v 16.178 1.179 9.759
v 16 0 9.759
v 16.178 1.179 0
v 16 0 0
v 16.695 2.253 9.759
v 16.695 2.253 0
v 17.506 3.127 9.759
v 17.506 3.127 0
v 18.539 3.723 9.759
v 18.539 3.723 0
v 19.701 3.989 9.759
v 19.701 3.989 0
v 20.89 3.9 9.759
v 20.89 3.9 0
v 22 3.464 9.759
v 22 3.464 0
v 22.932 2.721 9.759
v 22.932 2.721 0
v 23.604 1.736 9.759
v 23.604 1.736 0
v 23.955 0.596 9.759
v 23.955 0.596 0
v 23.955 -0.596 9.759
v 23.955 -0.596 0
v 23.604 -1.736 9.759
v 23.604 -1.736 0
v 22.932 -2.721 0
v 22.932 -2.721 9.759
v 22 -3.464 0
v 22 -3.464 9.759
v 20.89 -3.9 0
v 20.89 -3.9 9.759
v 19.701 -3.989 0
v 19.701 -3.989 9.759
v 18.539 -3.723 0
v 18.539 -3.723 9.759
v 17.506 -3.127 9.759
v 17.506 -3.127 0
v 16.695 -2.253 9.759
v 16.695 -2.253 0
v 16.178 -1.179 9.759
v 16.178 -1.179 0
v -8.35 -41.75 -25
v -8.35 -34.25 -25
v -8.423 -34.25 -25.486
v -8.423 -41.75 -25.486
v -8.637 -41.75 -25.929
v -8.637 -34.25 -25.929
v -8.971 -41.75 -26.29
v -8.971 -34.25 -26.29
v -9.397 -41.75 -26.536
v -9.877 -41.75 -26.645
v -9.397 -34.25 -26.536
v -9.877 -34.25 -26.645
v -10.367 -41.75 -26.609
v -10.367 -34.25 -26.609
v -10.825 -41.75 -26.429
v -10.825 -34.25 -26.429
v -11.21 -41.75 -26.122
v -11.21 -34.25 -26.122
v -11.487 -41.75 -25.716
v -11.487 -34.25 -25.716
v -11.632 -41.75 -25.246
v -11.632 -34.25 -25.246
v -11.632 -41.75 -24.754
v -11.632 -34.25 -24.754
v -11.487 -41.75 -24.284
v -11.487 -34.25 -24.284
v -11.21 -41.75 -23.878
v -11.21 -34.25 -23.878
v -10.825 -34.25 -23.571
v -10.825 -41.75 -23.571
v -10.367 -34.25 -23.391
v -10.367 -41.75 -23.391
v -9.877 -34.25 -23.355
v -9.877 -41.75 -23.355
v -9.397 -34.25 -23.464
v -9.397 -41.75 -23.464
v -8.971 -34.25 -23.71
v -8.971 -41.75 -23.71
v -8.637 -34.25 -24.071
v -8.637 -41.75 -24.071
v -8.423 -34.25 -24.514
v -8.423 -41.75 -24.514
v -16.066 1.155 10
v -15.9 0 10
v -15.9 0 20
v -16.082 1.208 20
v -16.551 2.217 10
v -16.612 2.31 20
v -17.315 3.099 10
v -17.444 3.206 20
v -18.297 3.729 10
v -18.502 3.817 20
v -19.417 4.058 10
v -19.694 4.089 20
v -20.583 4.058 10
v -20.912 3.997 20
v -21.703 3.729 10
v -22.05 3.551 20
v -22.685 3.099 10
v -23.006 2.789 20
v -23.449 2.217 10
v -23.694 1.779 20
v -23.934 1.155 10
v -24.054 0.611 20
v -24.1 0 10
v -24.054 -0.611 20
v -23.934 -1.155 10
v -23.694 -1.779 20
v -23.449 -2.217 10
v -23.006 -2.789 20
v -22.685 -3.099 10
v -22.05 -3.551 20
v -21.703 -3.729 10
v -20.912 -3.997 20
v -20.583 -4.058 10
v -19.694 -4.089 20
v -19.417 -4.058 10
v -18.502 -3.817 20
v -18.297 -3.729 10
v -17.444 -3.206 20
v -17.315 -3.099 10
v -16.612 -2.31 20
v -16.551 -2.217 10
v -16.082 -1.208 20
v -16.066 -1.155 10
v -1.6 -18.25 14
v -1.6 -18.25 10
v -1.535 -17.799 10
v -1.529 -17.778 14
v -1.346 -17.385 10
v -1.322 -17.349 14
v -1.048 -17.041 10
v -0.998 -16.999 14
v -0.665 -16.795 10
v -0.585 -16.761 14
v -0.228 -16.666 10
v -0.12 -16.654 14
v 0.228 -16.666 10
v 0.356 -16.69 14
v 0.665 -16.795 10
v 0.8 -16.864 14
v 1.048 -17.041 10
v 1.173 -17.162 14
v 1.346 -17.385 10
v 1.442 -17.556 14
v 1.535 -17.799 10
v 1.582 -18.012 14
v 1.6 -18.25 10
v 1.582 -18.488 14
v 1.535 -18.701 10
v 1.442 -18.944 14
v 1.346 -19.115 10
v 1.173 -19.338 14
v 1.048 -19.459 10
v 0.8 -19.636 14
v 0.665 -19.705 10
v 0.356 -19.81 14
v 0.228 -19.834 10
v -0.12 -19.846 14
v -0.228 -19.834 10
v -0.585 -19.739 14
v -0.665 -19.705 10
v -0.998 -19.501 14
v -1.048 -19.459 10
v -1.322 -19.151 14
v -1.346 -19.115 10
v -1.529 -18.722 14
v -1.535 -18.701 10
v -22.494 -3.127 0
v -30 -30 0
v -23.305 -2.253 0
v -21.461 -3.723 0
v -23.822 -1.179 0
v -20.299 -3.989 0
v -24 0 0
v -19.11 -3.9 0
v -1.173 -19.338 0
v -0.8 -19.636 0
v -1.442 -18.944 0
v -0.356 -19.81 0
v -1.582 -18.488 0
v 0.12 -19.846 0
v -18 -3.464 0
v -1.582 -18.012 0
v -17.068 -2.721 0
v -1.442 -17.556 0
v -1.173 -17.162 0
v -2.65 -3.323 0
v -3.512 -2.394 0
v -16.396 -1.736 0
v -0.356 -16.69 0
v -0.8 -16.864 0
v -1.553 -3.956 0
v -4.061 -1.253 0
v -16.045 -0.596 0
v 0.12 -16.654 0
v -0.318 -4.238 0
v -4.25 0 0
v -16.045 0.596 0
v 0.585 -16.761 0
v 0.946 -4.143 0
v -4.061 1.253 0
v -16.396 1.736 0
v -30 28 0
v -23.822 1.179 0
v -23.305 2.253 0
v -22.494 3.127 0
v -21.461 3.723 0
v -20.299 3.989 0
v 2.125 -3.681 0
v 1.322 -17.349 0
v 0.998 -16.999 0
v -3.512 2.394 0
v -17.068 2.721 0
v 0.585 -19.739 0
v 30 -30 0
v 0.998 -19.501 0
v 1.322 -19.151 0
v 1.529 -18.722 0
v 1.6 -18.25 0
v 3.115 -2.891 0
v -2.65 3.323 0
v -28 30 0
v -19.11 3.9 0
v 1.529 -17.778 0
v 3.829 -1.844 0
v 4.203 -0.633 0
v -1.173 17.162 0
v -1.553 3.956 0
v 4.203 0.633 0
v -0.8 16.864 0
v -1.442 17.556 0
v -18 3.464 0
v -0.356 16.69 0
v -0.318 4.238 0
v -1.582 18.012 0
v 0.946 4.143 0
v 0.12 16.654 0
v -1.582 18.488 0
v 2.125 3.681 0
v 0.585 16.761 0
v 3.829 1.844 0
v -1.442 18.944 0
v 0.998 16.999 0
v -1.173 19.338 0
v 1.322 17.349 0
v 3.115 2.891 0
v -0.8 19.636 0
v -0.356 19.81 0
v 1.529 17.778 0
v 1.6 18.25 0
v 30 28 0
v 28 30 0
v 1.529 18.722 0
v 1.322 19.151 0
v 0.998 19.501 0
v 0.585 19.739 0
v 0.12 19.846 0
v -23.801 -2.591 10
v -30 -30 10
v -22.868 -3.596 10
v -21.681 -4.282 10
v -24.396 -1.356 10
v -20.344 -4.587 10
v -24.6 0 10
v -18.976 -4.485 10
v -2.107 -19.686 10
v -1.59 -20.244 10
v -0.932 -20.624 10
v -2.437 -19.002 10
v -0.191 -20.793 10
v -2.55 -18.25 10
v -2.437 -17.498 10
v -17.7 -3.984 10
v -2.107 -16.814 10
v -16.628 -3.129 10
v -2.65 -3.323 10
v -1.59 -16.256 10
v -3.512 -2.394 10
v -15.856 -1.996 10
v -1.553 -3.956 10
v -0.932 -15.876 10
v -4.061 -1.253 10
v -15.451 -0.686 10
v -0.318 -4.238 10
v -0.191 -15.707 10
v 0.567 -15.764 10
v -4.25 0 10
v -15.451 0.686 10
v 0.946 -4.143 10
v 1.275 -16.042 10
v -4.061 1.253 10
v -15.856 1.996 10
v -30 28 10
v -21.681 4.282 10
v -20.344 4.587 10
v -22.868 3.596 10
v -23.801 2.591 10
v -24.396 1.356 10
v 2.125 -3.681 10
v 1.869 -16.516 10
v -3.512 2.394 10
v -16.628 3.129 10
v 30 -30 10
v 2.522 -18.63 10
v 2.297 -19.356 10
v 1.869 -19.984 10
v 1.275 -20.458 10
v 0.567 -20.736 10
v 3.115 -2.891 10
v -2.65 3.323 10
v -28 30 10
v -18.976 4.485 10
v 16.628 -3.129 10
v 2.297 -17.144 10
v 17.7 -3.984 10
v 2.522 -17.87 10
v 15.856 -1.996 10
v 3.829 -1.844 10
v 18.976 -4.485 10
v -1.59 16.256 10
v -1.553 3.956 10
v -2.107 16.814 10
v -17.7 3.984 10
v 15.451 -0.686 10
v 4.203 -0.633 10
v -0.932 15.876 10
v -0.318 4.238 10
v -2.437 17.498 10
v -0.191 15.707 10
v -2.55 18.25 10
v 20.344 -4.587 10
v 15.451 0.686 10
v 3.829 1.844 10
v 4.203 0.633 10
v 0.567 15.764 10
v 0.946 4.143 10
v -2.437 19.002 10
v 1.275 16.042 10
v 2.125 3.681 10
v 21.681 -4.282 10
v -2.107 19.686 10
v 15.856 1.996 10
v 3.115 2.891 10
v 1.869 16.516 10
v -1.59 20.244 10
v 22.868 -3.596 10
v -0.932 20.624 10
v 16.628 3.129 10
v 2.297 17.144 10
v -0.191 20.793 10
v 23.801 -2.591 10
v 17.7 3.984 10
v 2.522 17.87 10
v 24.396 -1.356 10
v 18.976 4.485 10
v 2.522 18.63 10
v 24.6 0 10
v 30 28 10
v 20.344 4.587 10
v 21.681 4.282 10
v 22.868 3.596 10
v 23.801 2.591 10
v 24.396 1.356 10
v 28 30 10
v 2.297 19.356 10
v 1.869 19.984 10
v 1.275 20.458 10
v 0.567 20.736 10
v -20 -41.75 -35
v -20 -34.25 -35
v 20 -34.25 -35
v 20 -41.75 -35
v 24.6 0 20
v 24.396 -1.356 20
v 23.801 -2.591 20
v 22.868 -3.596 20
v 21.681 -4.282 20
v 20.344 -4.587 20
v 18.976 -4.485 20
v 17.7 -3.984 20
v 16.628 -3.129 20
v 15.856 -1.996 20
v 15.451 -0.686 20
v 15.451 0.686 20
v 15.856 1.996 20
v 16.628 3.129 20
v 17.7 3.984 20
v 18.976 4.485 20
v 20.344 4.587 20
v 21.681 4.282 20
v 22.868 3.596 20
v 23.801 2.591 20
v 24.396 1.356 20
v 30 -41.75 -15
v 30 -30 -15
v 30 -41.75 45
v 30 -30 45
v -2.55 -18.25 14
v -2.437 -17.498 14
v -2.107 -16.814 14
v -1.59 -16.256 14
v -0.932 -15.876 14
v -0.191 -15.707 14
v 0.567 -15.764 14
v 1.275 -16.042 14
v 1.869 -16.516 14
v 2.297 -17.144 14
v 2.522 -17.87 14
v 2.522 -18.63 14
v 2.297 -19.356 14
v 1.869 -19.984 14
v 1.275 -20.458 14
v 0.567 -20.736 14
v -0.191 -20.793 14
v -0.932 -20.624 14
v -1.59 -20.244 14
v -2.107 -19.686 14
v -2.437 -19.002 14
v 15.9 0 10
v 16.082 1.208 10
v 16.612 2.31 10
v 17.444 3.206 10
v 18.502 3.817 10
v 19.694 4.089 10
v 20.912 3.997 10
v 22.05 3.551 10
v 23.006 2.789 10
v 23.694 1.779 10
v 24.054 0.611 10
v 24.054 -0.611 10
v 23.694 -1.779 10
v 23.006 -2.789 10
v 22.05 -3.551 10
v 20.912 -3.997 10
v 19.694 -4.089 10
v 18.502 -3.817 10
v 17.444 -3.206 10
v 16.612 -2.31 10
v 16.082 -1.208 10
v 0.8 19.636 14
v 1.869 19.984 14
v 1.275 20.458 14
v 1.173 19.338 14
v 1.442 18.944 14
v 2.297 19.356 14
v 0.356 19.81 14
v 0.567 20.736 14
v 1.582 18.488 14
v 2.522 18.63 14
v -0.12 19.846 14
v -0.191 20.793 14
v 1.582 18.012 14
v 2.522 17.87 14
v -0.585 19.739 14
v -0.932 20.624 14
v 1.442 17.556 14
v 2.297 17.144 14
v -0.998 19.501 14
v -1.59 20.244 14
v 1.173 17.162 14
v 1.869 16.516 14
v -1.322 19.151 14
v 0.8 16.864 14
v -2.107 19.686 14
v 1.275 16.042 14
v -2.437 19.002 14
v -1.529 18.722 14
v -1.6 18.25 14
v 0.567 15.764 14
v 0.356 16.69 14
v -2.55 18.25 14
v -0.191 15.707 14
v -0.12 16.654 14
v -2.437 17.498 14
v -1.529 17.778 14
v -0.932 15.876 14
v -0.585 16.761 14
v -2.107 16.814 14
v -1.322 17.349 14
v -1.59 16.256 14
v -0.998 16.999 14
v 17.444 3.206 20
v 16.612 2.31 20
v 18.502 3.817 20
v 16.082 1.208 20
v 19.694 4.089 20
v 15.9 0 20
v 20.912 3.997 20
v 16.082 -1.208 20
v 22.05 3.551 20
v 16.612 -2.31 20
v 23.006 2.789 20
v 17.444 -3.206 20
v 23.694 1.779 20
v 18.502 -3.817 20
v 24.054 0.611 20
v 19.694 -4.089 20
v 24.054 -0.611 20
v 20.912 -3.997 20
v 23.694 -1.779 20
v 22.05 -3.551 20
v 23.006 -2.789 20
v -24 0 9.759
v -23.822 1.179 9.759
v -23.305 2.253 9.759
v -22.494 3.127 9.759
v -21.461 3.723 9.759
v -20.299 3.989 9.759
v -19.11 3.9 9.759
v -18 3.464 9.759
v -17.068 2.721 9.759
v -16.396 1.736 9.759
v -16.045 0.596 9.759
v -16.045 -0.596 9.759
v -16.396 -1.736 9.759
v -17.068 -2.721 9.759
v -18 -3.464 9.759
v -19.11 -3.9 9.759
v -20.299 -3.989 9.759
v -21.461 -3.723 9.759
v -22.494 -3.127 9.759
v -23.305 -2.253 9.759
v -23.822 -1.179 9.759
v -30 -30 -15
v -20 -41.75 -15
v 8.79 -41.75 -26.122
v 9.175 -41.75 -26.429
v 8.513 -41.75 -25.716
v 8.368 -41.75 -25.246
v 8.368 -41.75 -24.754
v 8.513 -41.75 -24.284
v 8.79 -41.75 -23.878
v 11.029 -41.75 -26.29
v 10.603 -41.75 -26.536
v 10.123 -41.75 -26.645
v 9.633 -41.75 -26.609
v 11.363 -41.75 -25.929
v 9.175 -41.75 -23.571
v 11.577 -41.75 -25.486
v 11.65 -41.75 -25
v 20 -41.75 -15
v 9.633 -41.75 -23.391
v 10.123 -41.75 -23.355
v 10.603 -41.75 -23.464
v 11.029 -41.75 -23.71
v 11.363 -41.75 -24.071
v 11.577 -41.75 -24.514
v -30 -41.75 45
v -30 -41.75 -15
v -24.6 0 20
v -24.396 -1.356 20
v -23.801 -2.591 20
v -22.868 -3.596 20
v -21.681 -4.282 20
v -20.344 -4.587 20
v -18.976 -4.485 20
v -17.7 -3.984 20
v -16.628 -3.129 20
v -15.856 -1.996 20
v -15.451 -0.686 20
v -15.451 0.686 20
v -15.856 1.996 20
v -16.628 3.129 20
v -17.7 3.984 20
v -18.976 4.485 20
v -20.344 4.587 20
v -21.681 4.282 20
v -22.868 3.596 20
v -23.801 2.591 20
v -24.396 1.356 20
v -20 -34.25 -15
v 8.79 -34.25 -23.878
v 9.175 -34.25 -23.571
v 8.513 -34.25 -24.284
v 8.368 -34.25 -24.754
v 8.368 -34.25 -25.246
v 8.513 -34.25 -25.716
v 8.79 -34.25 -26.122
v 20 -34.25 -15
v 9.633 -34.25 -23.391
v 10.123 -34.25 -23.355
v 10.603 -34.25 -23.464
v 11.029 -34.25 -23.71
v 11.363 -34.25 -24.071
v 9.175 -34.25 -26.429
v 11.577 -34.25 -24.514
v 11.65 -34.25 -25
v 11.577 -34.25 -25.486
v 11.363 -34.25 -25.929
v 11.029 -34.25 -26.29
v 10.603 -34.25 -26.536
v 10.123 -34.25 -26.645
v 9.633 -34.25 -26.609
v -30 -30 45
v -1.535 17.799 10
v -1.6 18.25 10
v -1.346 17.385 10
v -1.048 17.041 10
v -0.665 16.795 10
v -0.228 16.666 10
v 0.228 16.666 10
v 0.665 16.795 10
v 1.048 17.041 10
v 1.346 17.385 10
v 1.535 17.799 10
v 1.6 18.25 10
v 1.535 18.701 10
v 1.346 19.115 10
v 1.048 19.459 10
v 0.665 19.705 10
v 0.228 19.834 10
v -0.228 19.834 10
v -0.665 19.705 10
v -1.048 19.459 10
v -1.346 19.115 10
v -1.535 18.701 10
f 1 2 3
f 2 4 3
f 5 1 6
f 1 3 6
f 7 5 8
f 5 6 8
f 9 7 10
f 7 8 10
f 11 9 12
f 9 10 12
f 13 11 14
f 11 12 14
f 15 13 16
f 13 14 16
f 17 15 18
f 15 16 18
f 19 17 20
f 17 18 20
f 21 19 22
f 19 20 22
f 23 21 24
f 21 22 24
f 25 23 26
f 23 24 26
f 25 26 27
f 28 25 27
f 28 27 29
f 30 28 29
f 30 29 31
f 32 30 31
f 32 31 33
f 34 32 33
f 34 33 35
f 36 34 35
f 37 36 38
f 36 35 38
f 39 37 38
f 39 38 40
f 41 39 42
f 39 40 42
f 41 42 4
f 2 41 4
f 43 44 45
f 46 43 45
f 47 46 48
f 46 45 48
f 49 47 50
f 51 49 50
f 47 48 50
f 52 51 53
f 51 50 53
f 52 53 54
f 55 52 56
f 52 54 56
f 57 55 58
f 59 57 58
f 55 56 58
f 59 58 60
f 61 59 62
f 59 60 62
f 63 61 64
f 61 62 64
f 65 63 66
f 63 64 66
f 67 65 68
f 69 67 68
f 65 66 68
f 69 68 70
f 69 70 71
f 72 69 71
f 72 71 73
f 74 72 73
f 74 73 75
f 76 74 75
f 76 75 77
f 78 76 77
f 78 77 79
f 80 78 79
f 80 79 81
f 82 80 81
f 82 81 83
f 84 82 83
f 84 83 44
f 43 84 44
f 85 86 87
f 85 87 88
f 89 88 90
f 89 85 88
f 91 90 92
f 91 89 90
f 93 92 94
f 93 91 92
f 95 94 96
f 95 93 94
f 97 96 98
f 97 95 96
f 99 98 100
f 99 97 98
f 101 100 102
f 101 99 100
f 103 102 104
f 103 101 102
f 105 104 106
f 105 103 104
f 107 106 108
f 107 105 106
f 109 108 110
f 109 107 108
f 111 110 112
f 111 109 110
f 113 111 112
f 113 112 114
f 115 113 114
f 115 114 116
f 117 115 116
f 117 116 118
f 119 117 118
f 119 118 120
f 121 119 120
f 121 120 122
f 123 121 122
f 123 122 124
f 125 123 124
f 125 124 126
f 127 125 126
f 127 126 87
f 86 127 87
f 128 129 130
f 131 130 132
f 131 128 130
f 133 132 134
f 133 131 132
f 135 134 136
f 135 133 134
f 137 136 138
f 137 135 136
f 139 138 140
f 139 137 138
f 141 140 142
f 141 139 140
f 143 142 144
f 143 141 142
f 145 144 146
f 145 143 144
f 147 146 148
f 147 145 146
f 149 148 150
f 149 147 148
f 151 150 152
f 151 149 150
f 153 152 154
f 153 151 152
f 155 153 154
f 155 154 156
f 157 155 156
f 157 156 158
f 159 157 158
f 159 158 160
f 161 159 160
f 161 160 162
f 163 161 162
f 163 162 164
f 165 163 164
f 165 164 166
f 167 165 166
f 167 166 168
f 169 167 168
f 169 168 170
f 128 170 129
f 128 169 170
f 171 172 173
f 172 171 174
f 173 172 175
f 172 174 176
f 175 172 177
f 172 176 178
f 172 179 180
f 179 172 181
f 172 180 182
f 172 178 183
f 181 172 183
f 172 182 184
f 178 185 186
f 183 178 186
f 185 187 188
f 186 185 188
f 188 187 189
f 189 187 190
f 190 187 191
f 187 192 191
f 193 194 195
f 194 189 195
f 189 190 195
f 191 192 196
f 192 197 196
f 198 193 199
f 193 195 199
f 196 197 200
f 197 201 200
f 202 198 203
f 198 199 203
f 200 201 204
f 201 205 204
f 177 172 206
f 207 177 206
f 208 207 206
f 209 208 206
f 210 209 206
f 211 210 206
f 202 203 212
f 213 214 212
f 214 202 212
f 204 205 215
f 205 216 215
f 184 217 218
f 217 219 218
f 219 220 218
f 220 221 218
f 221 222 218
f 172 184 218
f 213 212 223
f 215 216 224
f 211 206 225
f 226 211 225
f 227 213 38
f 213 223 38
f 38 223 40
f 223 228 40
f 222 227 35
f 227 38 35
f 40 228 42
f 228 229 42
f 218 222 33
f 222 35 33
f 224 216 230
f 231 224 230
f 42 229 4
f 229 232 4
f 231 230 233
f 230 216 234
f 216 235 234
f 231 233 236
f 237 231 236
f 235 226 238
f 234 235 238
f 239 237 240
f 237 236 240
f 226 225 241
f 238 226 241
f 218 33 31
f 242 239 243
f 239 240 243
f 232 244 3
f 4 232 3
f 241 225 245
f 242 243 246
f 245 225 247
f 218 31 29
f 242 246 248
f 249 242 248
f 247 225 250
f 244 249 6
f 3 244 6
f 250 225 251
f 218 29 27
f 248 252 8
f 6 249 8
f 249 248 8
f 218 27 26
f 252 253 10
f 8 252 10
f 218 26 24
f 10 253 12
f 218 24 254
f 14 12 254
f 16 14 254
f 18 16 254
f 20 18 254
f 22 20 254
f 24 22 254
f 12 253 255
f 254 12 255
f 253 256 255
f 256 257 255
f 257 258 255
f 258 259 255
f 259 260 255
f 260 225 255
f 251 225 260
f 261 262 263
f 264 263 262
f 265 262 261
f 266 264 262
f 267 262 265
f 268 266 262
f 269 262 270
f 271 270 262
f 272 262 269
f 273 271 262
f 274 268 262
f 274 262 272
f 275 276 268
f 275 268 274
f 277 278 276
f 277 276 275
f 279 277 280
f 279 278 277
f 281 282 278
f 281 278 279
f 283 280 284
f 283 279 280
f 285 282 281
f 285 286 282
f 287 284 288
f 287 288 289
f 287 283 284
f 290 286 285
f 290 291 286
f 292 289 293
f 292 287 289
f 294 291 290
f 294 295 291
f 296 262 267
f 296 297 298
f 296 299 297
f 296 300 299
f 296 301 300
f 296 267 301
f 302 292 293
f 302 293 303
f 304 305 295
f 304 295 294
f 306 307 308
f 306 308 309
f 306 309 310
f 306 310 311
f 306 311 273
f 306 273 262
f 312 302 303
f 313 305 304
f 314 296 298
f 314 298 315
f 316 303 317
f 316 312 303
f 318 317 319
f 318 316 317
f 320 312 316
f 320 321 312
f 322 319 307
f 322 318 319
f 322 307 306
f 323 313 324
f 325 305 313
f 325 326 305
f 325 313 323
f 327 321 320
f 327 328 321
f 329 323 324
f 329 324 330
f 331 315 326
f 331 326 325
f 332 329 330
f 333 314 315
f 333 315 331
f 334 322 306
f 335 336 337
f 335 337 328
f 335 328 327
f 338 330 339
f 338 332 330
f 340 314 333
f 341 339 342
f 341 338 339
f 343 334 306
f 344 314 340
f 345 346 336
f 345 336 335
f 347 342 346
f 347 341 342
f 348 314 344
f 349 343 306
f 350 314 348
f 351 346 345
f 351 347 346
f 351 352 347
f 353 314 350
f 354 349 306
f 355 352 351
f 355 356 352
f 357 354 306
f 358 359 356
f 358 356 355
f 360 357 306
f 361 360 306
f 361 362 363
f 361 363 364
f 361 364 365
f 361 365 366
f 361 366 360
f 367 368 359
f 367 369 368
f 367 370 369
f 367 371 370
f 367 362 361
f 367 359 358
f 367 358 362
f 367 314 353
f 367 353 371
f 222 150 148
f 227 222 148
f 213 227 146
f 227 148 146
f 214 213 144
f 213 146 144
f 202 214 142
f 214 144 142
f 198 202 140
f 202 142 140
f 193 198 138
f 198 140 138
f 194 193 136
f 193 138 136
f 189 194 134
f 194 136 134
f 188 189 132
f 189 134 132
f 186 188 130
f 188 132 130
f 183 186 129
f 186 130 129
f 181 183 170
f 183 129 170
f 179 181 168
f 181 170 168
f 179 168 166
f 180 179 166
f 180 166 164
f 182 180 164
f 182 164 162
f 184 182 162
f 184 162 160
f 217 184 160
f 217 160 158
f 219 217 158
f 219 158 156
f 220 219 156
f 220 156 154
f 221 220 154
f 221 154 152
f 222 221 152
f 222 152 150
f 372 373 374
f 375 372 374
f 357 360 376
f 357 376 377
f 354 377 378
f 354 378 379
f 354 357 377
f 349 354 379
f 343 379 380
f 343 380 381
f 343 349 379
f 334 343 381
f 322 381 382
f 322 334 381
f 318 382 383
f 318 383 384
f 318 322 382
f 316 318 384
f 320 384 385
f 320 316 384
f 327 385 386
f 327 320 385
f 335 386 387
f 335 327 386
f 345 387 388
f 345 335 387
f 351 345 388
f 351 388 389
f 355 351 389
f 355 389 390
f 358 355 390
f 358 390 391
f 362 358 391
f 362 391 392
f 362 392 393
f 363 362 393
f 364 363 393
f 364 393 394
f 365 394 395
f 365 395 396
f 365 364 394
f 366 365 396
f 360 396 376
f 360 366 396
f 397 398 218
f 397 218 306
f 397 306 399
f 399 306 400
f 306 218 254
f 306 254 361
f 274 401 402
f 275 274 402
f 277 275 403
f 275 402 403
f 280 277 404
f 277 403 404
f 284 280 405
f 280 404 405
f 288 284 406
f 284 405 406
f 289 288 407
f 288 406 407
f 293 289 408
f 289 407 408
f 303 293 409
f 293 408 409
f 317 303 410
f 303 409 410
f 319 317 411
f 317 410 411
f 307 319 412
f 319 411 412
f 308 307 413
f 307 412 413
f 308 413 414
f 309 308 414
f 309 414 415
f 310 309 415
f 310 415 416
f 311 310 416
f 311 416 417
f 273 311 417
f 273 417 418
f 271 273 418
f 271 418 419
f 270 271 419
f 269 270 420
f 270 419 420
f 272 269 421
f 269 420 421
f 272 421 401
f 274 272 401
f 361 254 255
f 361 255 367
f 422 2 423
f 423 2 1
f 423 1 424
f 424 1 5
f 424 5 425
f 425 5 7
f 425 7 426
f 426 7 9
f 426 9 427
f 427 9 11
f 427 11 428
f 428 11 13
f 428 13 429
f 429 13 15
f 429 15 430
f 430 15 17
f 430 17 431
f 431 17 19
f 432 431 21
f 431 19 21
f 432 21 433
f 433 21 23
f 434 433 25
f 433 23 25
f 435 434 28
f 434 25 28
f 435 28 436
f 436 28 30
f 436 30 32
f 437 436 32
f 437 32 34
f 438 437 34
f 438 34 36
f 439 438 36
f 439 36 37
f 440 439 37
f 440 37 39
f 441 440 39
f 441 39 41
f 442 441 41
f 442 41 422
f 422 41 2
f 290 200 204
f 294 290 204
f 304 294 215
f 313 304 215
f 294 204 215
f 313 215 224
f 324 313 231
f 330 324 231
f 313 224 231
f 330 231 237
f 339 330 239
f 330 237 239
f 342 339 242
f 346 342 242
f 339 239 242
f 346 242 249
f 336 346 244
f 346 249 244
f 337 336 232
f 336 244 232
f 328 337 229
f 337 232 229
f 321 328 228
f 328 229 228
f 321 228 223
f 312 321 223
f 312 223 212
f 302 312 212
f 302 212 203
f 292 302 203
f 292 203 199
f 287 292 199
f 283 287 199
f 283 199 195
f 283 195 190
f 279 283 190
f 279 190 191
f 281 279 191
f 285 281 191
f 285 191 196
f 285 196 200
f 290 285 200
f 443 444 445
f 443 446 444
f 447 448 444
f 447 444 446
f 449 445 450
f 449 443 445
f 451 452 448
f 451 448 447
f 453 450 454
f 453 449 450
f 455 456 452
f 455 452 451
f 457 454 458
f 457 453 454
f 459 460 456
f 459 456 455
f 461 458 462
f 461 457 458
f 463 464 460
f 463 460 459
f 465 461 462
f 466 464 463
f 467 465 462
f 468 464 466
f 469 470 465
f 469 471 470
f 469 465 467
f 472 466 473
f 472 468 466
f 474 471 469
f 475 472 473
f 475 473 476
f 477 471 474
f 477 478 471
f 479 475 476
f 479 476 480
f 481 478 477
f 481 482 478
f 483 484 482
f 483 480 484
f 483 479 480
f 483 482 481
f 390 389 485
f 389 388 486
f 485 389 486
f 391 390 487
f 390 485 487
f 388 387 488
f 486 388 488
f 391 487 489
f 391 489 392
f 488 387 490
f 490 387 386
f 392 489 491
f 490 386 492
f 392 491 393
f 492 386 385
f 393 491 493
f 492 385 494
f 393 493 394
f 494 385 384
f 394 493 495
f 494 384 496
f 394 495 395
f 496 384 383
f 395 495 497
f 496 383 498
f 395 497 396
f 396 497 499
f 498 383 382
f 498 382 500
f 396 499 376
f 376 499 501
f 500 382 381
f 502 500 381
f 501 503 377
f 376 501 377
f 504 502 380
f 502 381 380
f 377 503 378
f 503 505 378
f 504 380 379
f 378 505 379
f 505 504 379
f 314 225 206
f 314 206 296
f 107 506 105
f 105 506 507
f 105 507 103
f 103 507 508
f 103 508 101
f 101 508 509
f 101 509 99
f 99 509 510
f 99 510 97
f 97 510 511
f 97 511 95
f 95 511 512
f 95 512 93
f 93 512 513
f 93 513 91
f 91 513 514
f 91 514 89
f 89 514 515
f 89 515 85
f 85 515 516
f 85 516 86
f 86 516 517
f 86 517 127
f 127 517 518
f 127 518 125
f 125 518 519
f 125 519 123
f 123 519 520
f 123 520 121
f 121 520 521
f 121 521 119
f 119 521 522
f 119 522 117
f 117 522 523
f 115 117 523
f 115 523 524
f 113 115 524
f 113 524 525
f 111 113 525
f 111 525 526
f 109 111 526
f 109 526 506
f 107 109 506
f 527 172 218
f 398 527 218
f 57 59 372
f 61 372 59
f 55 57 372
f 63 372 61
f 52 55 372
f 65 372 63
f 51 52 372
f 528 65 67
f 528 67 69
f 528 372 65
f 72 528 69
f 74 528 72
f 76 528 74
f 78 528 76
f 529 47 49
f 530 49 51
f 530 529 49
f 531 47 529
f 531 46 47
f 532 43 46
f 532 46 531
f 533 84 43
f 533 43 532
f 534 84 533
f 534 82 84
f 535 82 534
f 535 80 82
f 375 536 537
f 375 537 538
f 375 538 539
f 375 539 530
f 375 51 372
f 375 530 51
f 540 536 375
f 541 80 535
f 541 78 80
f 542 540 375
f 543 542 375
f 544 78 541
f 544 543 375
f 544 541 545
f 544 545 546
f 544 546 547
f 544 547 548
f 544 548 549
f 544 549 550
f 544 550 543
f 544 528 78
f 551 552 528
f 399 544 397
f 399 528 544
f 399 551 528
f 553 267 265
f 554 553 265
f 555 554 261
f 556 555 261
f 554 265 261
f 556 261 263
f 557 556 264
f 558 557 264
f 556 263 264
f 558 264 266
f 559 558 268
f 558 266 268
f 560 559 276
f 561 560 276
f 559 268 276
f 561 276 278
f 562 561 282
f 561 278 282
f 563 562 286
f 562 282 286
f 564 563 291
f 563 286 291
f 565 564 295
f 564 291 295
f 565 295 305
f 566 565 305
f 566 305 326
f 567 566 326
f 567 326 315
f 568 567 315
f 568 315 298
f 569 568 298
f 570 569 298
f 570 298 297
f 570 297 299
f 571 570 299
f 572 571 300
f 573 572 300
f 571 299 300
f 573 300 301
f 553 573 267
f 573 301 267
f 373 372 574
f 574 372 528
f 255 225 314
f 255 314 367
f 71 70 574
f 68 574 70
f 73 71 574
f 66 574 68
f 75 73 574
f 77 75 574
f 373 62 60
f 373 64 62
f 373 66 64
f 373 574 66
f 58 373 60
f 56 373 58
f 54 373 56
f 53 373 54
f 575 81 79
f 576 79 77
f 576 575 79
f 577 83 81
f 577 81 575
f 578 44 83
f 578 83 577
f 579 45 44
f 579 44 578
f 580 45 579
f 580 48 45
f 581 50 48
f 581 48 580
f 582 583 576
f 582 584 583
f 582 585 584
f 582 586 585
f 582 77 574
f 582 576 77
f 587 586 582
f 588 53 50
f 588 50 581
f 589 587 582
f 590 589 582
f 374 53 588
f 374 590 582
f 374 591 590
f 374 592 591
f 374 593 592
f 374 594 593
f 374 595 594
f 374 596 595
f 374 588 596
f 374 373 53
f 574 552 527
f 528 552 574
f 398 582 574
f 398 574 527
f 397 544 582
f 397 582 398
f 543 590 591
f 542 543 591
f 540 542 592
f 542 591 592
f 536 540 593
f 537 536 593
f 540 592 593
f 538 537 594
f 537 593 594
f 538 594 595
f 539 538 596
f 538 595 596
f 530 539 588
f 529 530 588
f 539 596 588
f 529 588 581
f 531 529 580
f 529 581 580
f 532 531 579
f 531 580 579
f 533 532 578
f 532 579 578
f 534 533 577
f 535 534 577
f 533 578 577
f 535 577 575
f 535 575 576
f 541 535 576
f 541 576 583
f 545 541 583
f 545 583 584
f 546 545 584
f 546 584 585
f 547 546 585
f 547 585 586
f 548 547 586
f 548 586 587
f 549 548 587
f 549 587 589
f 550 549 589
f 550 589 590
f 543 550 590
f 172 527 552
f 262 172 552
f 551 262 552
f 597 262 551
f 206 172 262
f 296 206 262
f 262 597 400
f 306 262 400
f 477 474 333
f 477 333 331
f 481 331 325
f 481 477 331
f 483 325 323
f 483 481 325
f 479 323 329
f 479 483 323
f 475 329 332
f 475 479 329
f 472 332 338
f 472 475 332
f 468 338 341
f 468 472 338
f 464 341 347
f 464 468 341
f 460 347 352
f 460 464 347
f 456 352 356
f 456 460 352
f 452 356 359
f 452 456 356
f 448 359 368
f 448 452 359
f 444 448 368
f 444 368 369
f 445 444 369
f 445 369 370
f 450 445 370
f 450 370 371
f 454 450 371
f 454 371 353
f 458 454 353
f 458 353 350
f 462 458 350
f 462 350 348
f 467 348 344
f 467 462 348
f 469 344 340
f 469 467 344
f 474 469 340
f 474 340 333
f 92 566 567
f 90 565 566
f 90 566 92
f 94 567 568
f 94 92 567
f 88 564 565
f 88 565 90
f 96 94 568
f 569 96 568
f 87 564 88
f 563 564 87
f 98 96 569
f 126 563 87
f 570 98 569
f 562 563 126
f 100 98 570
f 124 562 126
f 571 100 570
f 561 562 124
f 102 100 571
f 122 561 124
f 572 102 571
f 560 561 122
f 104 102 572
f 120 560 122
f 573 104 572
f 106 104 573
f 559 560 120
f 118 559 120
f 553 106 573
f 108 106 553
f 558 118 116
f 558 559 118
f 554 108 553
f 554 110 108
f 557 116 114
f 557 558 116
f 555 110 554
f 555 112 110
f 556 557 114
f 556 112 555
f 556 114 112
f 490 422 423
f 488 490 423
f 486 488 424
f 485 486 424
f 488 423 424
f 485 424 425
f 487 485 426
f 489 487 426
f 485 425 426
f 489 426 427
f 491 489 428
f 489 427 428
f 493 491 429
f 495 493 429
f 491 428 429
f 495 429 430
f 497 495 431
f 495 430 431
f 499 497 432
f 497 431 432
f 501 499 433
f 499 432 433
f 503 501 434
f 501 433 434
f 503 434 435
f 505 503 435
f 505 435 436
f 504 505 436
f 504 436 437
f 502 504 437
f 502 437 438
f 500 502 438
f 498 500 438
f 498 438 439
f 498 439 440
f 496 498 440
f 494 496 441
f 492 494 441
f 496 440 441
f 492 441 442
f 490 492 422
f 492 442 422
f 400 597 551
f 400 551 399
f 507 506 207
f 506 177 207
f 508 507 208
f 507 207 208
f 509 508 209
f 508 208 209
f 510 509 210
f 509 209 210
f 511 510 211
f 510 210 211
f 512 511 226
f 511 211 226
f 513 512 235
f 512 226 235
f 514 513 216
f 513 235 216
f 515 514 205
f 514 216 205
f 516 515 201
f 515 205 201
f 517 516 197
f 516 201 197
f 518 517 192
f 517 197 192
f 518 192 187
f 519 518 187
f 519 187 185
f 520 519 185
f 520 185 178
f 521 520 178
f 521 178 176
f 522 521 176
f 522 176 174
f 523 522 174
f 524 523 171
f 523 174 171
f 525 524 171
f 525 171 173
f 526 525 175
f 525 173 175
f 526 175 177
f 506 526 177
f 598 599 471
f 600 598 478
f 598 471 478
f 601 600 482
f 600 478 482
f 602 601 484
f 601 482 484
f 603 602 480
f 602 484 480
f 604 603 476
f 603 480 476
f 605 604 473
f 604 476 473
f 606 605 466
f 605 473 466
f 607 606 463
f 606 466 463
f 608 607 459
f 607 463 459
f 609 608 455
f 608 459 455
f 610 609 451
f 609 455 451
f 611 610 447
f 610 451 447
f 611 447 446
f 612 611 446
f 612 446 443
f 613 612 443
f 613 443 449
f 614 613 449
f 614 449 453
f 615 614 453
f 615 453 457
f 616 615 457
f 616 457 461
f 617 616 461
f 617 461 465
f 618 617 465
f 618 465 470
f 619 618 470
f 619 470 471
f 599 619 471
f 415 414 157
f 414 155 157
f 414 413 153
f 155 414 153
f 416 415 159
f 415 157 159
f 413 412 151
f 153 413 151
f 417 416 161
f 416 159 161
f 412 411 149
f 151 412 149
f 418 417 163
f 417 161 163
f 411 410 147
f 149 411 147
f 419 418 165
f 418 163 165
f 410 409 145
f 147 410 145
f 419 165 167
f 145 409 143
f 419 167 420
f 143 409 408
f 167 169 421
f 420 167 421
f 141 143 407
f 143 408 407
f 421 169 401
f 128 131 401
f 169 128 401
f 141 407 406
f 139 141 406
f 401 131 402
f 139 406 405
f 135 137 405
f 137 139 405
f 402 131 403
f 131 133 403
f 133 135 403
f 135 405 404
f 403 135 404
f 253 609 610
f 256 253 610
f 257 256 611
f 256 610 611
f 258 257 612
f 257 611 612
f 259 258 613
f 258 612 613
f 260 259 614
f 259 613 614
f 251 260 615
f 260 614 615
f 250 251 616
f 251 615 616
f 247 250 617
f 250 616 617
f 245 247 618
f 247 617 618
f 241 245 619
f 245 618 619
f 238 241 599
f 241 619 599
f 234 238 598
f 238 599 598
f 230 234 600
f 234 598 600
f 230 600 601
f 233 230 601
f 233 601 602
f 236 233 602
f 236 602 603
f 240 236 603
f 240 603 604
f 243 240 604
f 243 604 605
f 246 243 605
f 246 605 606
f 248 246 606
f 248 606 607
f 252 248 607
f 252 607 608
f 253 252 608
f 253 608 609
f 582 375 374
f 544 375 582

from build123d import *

# Parameters (mm, degrees)
SKETCH_1_W                = 60
SKETCH_1_H                = 60
EXTRUDE_1_DEPTH           = 10
HOLE_WIZARD_1_D           = 8.5
HOLE_WIZARD_1_DEPTH       = 20
HOLE_WIZARD_2_D           = 8
HOLE_WIZARD_2_CSINK_D     = 8.2
HOLE_WIZARD_2_CSINK_ANGLE = 45
HOLE_WIZARD_3_D           = 3.2
SKETCH_8_R                = 4.6
SKETCH_8_R_2              = 4.1
EXTRUDE_2_DEPTH           = 10
EXTRUDE_START             = 4
SKETCH_10_R               = 2.55
SKETCH_10_R_2             = 1.6
EXTRUDE_4_DEPTH           = 4
SKETCH_11_W               = 60
SKETCH_11_H               = 80
EXTRUDE_5_DEPTH           = 11.75
SKETCH_12_W               = 10
SKETCH_12_H               = 20
CUT_EXTRUDE_3_DEPTH       = 90.850222593
SKETCH_13_W               = 40
SKETCH_13_H               = 20
CUT_EXTRUDE_4_DEPTH       = 4.25
HOLE_WIZARD_4_D           = 3.3
CHAMFER_1_SIZE            = 2


with BuildPart() as part:
    # 草图1 → 凸台-拉伸1 (new body)
    with BuildSketch(Plane.XY):
        Rectangle(SKETCH_1_W, SKETCH_1_H)
    extrude(amount=EXTRUDE_1_DEPTH)

    # 孔1
    with Locations(Plane.XY.offset(10)):
        with Locations((0, 0)):
            Hole(HOLE_WIZARD_1_D / 2, depth=HOLE_WIZARD_1_DEPTH)

    # 孔2 (through all)
    with Locations(Plane.XY.offset(10)):
        with Locations((20, 0), (-20, 0)):
            CounterSinkHole(HOLE_WIZARD_2_D / 2, HOLE_WIZARD_2_CSINK_D / 2, counter_sink_angle=HOLE_WIZARD_2_CSINK_ANGLE)

    # 孔3 (through all)
    with Locations(Plane(origin=(0, 0, 0), x_dir=(-1, 0, 0), z_dir=(0, 0, -1))):
        with Locations((0, 18.25), (0, -18.25)):
            Hole(HOLE_WIZARD_3_D / 2)

    # 草图8 → 凸台-拉伸2 (add)
    with BuildSketch(Plane.XY.offset(10)):
        with Locations(Location((-20, 0, 0), (0, 0, 180))):
            Circle(SKETCH_8_R)
        with Locations((-20, 0)):
            Circle(SKETCH_8_R_2, mode=Mode.SUBTRACT)
    extrude_2 = extrude(amount=EXTRUDE_2_DEPTH)

    # 镜向1: 凸台-拉伸2 across plane
    add(extrude_2.mirror(Plane(origin=(0, 0, 0), x_dir=(0, 0, 1), z_dir=(1, 0, 0))))

    # 草图10 → 凸台-拉伸4 (add)
    with BuildSketch(Plane.XY.offset(10).offset(EXTRUDE_START)):
        with Locations(Location((0, 18.25, 0), (0, 0, 180))):
            Circle(SKETCH_10_R)
        with Locations(Location((0, 18.25, 0), (0, 0, 180))):
            Circle(SKETCH_10_R_2, mode=Mode.SUBTRACT)
    extrude_4 = extrude(amount=-EXTRUDE_4_DEPTH)

    # 镜向4: 凸台-拉伸4 across plane
    add(extrude_4.mirror(Plane.ZX))

    # 草图11 → 凸台-拉伸5 (add)
    with BuildSketch(Plane.XZ.offset(30)):
        with Locations((0, 5)):
            Rectangle(SKETCH_11_W, SKETCH_11_H)
    extrude(amount=EXTRUDE_5_DEPTH)

    # 草图12 → 切除-拉伸3 (cut, through all)
    with BuildSketch(Plane.XZ.offset(41.75)):
        with Locations((-25, -25)):
            Rectangle(SKETCH_12_W, SKETCH_12_H)
        with Locations((25, -25)):
            Rectangle(SKETCH_12_W, SKETCH_12_H)
    extrude(amount=-CUT_EXTRUDE_3_DEPTH, mode=Mode.SUBTRACT)

    # 草图13 → 切除-拉伸4 (cut)
    with BuildSketch(Plane(origin=(0, -30, 0), x_dir=(1, 0, 0), z_dir=(0, 1, 0))):
        with Locations((0, 25)):
            Rectangle(SKETCH_13_W, SKETCH_13_H)
    extrude(amount=-CUT_EXTRUDE_4_DEPTH, mode=Mode.SUBTRACT)

    # 孔4 (through all)
    with Locations(Plane(origin=(0, -41.75, 0), x_dir=(-1, 0, 0), z_dir=(0, -1, 0))):
        with Locations((-10, 25), (10, 25)):
            Hole(HOLE_WIZARD_4_D / 2)

    # 倒角1
    chamfer_1_edges = [part.edges().sort_by_distance(p)[0] for p in [
        (-30, 30, 5),
        (30, 30, 5),
    ]]
    chamfer(chamfer_1_edges, length=CHAMFER_1_SIZE)


solid = part.part
